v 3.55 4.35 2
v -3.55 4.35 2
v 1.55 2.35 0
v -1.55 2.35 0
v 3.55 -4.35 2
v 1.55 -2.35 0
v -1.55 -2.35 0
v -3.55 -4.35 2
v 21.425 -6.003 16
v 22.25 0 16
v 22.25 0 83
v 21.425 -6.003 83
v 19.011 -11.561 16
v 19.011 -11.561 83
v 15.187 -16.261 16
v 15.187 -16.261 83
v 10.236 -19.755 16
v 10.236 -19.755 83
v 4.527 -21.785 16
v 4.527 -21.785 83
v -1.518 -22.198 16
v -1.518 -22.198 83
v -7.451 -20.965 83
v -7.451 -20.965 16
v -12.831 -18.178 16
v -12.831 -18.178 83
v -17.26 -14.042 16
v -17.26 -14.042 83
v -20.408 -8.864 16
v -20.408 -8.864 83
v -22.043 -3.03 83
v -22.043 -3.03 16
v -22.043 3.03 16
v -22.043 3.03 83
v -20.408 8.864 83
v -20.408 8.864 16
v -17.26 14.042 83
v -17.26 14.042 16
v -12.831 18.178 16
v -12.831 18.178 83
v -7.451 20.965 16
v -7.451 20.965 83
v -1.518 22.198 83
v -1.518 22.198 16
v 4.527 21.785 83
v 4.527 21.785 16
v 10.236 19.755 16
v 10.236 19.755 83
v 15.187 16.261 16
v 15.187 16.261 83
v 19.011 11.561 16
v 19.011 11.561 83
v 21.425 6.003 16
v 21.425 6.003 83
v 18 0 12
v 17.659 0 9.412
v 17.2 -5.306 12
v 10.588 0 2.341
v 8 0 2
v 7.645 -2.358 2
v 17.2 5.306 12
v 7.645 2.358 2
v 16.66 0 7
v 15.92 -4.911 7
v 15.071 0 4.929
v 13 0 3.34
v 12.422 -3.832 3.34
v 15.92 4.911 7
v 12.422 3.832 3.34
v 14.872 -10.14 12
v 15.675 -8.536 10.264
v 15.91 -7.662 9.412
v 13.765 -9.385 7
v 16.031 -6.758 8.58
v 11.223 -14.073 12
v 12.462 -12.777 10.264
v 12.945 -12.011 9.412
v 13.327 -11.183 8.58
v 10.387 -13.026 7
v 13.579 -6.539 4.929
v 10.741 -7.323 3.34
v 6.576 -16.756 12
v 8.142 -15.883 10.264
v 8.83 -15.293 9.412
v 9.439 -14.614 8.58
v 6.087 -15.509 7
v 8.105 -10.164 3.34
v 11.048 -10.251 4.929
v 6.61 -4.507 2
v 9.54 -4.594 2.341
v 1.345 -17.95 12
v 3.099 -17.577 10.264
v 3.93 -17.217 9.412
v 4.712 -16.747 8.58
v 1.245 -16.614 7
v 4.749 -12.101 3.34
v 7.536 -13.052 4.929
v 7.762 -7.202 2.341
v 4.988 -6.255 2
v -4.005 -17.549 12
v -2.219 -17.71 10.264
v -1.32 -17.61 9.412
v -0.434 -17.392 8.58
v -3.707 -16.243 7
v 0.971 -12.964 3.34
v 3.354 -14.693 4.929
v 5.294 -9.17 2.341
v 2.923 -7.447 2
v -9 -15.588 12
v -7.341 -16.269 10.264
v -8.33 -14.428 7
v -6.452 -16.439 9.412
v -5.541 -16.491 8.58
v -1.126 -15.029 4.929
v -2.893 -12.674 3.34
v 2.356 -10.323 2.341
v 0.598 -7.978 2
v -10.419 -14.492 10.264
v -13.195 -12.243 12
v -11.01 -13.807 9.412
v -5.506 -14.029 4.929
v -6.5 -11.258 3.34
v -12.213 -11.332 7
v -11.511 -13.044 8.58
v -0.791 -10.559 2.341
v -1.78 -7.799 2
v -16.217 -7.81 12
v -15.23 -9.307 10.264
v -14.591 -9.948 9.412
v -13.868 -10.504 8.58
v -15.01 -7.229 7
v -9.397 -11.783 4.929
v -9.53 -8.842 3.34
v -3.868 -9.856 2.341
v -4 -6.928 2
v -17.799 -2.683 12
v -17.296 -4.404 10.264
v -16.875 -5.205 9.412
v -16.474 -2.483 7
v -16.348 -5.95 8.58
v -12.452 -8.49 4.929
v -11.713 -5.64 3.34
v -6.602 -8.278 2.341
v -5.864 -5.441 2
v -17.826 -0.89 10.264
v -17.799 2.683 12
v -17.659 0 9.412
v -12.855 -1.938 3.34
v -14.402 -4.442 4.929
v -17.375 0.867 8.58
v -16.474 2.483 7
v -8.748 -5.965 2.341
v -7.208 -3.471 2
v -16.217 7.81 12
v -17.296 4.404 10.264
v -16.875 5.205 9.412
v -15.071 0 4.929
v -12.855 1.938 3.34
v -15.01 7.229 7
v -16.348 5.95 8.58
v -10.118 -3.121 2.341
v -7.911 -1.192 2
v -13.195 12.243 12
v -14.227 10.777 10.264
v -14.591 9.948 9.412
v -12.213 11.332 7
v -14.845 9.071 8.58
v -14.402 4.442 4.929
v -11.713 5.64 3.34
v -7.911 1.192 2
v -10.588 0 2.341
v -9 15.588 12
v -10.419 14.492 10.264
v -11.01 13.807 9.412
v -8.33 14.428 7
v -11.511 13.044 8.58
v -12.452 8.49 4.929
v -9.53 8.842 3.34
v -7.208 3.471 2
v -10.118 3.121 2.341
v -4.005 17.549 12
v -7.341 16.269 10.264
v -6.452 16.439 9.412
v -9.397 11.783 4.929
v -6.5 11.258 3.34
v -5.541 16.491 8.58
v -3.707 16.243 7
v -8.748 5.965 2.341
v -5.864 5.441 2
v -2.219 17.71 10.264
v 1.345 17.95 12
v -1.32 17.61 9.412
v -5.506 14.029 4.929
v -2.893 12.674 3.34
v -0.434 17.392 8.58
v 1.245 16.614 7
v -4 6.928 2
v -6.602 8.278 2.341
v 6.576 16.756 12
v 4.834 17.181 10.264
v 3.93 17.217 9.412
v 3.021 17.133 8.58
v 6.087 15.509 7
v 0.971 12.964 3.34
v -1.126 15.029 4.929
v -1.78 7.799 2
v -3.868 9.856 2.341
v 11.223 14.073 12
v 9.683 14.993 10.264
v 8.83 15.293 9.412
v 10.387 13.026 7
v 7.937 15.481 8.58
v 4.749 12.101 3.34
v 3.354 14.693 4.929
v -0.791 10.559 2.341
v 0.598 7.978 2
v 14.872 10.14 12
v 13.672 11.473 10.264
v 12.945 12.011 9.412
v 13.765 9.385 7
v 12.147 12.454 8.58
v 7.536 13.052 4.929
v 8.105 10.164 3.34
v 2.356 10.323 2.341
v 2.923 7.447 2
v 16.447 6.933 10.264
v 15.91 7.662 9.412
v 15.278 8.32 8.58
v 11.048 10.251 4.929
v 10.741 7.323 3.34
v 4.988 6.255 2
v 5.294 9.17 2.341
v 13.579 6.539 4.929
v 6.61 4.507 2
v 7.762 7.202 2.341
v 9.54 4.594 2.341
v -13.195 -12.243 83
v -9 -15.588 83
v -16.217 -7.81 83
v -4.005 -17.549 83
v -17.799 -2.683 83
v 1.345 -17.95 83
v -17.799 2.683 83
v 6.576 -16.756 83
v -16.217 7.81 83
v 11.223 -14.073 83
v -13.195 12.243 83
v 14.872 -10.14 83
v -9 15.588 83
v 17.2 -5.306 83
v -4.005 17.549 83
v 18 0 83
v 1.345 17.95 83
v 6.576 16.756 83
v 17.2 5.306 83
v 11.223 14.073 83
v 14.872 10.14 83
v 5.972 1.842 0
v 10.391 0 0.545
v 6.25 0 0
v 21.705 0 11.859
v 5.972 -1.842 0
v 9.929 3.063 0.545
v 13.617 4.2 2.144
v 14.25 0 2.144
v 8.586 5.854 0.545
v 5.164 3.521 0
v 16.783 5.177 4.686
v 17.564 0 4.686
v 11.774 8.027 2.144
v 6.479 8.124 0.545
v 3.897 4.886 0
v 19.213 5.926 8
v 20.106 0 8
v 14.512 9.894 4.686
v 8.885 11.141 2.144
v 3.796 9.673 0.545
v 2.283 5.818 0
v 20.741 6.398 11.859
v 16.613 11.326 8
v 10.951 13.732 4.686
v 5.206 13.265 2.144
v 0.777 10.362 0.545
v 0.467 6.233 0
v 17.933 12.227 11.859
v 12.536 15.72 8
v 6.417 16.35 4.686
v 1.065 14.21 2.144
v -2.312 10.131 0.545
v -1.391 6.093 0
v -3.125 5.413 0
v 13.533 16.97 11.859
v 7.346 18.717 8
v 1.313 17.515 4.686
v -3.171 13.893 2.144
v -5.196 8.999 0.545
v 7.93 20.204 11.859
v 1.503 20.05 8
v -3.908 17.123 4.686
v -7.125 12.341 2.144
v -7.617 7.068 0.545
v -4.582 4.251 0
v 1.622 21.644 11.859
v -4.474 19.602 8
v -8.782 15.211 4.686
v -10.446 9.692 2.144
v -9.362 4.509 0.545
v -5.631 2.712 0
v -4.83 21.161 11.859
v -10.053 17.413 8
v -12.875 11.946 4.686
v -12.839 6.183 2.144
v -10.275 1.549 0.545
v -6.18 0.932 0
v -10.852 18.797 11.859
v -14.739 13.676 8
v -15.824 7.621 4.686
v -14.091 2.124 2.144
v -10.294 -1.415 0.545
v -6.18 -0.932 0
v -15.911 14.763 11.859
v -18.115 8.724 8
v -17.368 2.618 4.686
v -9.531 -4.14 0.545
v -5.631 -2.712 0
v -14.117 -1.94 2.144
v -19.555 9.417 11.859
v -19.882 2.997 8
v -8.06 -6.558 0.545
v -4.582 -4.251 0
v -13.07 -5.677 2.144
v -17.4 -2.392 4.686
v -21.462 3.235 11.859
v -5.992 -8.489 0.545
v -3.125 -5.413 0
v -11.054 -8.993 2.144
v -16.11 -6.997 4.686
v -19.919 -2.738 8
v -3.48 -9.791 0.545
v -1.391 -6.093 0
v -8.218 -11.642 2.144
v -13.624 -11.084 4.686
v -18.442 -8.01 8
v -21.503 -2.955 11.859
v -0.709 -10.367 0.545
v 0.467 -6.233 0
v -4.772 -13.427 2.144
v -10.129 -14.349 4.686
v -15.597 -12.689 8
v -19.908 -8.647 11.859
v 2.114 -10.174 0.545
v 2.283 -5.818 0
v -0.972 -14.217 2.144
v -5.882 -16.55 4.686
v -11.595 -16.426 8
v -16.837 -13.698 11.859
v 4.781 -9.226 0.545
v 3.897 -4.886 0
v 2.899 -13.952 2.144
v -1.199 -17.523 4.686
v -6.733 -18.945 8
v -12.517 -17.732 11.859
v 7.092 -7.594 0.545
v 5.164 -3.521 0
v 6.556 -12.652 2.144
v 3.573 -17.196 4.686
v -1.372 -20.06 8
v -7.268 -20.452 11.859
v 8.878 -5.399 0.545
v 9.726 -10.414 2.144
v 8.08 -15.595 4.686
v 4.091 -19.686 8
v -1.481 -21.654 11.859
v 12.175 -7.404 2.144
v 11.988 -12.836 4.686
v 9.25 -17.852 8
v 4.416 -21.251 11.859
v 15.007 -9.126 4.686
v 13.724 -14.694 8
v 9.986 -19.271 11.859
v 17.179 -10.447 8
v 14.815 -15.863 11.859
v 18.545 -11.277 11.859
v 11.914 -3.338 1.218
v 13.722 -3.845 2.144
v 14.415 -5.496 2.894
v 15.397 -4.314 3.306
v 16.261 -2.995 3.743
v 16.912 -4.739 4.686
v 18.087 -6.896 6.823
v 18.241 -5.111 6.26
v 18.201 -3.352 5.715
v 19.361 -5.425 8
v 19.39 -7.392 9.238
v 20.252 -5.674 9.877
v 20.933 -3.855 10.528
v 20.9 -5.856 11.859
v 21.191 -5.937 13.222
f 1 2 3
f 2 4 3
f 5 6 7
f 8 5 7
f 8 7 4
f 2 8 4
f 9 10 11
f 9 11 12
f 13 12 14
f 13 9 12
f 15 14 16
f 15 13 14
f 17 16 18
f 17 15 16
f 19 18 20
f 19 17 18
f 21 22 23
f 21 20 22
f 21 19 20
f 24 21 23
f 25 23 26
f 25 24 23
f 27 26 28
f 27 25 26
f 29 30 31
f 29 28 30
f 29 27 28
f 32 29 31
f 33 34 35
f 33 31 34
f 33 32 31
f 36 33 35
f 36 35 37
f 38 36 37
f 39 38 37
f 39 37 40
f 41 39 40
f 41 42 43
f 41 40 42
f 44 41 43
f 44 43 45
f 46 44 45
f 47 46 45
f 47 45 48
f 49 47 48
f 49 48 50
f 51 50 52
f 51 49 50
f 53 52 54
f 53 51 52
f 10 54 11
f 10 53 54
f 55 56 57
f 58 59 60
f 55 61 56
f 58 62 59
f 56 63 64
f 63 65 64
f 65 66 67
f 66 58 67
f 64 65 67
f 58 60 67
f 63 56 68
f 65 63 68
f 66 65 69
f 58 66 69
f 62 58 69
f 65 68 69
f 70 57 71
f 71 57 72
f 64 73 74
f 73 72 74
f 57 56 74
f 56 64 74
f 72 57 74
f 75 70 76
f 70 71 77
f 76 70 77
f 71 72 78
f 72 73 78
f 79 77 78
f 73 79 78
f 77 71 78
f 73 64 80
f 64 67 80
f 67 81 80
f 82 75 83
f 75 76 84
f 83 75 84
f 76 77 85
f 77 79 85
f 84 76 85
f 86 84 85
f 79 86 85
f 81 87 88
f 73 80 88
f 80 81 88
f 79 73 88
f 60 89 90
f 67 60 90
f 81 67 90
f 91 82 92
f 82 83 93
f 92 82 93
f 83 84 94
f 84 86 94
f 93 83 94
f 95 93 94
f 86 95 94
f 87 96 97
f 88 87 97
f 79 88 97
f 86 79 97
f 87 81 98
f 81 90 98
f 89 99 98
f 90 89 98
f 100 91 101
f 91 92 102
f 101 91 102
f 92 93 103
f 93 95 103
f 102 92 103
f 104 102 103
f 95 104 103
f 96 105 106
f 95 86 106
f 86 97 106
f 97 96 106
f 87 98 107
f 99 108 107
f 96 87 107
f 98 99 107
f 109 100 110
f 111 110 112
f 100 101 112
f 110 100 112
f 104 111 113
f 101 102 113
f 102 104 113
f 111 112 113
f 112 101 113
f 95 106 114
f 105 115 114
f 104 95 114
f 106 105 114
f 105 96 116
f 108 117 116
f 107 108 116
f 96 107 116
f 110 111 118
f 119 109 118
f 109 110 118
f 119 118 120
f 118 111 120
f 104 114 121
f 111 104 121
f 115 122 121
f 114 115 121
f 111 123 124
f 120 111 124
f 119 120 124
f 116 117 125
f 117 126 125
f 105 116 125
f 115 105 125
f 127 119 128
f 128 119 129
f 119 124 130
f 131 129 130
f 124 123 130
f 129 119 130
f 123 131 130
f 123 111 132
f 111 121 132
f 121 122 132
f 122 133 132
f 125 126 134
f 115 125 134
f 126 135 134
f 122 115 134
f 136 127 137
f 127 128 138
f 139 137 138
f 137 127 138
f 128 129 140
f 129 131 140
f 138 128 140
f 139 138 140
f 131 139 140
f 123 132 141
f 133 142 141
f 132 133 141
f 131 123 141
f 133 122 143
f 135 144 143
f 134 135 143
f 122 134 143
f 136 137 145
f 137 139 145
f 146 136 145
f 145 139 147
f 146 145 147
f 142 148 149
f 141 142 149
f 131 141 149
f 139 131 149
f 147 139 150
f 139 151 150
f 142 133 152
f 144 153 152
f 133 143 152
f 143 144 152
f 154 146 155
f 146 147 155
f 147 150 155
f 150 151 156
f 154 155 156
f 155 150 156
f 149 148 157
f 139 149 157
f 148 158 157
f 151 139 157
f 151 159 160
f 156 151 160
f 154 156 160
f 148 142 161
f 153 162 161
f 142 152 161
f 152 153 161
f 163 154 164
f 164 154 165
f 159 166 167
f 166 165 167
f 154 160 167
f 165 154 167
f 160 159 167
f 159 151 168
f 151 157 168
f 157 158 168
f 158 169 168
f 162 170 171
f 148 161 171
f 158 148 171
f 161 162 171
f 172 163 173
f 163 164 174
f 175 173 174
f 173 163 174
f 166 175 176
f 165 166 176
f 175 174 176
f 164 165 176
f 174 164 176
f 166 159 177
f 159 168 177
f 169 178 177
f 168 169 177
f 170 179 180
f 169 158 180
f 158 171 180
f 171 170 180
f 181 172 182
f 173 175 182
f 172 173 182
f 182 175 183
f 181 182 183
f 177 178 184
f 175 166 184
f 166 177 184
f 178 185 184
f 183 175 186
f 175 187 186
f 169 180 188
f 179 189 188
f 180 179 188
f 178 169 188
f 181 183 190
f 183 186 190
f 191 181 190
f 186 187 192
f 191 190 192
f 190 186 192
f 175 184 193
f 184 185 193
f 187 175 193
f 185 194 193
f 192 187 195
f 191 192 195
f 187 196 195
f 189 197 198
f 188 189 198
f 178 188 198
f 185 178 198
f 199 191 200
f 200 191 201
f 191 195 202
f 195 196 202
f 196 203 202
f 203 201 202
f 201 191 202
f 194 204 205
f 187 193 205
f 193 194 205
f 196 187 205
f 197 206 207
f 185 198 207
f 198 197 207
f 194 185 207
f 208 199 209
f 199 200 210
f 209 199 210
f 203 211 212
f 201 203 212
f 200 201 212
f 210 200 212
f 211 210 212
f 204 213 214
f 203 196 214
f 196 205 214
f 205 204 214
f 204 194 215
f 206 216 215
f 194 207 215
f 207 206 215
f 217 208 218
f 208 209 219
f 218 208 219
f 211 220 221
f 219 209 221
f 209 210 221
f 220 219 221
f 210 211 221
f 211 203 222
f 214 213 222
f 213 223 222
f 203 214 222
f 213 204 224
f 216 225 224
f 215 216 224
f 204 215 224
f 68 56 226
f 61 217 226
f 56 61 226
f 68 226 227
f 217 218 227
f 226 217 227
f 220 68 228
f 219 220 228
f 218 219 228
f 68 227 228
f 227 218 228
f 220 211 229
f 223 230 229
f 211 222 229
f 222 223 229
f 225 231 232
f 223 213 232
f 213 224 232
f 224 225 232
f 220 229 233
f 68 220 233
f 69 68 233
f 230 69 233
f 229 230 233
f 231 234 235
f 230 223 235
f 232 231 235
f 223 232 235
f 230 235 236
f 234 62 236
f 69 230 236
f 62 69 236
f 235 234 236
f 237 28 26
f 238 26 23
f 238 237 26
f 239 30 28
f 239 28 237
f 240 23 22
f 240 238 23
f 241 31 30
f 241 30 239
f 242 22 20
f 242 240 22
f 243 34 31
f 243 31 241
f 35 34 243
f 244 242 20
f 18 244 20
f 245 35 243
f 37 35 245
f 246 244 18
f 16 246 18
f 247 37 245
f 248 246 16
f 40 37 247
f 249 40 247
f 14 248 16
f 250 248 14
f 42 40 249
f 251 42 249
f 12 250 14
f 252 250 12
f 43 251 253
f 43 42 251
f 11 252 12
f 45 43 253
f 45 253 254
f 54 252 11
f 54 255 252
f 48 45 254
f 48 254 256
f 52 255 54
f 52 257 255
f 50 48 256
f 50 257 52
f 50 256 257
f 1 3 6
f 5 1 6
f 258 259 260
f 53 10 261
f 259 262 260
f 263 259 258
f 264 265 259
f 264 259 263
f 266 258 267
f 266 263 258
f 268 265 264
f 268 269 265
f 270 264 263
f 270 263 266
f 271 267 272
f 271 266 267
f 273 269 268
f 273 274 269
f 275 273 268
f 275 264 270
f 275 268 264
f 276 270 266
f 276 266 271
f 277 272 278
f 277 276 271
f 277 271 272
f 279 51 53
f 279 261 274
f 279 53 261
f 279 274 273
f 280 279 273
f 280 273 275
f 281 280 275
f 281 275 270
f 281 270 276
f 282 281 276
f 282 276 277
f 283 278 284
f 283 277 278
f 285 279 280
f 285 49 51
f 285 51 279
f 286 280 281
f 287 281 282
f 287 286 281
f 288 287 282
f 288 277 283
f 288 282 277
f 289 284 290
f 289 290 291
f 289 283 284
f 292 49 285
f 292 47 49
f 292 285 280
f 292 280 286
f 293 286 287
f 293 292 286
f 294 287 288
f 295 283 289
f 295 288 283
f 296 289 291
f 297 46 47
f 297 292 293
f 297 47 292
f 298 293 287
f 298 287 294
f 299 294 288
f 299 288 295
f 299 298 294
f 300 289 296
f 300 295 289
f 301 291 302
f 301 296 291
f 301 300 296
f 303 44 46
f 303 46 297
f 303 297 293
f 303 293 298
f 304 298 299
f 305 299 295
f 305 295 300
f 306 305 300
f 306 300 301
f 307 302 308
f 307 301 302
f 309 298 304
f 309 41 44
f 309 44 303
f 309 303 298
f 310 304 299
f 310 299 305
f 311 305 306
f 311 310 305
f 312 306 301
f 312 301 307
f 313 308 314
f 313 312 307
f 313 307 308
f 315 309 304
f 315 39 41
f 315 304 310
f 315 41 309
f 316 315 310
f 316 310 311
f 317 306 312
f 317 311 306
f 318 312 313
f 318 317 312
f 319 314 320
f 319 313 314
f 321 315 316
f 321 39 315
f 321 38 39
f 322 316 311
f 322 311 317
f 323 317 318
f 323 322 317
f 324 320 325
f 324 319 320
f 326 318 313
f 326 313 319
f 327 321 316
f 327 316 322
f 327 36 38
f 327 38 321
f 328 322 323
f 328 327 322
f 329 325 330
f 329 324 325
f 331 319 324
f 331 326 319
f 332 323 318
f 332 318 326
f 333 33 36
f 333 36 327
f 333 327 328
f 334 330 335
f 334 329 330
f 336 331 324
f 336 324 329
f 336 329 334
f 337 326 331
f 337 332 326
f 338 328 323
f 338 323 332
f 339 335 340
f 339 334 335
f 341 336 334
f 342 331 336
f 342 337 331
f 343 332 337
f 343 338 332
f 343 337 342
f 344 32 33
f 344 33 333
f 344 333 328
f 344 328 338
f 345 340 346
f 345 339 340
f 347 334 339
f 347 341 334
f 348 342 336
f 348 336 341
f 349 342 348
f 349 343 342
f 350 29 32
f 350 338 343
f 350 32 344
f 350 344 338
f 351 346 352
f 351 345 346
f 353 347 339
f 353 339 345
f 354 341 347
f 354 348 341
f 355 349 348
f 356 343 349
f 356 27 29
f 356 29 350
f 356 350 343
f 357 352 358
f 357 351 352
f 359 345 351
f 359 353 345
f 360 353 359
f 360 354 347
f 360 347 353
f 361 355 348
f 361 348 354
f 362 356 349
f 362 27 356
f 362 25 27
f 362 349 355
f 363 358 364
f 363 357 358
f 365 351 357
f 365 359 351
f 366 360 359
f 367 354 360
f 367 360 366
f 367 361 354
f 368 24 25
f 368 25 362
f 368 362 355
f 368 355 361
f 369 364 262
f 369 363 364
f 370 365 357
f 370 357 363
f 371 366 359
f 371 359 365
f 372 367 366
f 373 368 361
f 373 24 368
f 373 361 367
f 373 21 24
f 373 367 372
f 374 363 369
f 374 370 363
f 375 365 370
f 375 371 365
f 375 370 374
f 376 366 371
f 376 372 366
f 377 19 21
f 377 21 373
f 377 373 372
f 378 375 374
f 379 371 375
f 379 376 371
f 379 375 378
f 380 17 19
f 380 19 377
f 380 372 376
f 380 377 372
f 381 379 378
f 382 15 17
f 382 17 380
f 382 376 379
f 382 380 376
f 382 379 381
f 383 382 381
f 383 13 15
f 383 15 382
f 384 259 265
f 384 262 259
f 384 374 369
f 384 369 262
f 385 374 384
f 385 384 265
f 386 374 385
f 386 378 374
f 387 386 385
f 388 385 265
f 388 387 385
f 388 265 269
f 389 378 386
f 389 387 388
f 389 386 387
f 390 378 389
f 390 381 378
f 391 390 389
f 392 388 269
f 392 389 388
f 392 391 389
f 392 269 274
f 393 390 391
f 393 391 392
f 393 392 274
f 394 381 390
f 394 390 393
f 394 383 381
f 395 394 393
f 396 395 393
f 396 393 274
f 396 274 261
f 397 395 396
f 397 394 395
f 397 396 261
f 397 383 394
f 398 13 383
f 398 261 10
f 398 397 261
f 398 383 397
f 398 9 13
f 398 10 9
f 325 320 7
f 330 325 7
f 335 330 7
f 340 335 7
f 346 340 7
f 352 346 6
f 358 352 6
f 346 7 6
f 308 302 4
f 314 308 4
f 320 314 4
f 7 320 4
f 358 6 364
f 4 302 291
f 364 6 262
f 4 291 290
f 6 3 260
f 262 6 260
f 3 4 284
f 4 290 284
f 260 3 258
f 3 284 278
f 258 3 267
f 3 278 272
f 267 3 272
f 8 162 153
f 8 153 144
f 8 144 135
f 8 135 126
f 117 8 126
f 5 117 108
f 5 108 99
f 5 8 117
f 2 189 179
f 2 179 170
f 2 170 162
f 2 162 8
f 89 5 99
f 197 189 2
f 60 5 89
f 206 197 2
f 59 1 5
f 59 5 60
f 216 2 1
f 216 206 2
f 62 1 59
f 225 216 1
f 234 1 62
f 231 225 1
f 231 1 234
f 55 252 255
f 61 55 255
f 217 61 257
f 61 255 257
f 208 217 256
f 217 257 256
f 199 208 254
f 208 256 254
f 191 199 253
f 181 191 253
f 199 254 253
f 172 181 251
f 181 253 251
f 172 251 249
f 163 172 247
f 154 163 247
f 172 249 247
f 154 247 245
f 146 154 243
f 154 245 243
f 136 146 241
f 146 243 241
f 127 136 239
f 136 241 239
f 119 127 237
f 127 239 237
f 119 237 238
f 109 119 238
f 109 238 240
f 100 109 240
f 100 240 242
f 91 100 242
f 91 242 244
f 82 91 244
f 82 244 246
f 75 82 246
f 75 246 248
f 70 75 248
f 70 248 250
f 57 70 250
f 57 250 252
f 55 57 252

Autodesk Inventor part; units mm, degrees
ref_plane "YZ Plane" through (0, 0, 0) normal (1, 0, 0) x (0, 1, 0)
ref_plane "XZ Plane" through (0, 0, 0) normal (0, 1, 0) x (-1, 0, 0)
ref_plane "XY Plane" through (0, 0, 0) normal (0, 0, 1) x (1, 0, 0)
sketch "Sketch2" plane through (0, 0, 0) normal (0, 0, 1) x (1, 0, 0)
  circle A0 centre (0, 0) radius 22.25
  dimension "d2" = 44.5
extrude "Extrusion1" add sketch "Sketch2" along normal blind 83
sketch "Sketch9" plane through (0, 0, 83) normal (0, 0, 1) x (1, 0, 0)
  circle A0 centre (0, 0) radius 22.25 projected
  line L0 (-31.15, 0) -> (31.15, 0) projected
  line L1 (0, -31.15) -> (0, 31.15) projected
  circle A1 centre (0, 0) radius 18
  dimension "d54" = 36
extrude "Extrusion7" cut sketch "Sketch9" against normal blind 81 contours A1 L1 L0 | L0 L1 A1 | L1 L0 A1 | A1 L0 L1
fillet "Fillet12" radius 10 1 edges at (-18, 0, 2)
sketch "Sketch18" plane through (0, 0, 2) normal (0, 0, 1) x (1, 0, 0)
  line L0 (-31.15, 0) -> (31.15, 0) projected
  line L1 (0, -31.15) -> (0, 31.15) projected
  line L2 (1.55, 2.35) -> (-1.55, 2.35)
  line L3 (-1.55, 2.35) -> (-1.55, -2.35)
  line L4 (-1.55, -2.35) -> (1.55, -2.35)
  line L5 (1.55, -2.35) -> (1.55, 2.35)
  line L6 (1.55, 2.35) -> (-1.55, -2.35) construction
  line L7 (-1.55, 2.35) -> (1.55, -2.35) construction
  point P0 (0, 0)
  dimension "d122" = 3.1
  dimension "d123" = 4.7
extrude "Extrusion15" cut sketch "Sketch18" against normal through all
chamfer "Chamfer8" distance 2 angle 45 4 edges at (1.55, 0, 2) (0, 2.35, 2) (0, -2.35, 2) (-1.55, 0, 2)
fillet "Fillet13" radius 16 1 edges at (-22.25, 0, 0)
equation "\"BendRadius\" = Thickness"
equation "\"BendReliefWidth\" = Thickness"
equation "\"BendReliefDepth\" = 0.5 * Thickness"
equation "\"CornerReliefSize\" = 4 * Thickness"
equation "\"MinimumRemnant\" = 2 * Thickness"
equation "\"TransitionRadius\" = BendRadius"
equation "\"JacobiRadiusSize\" = BendRadius"
equation "\"GapSize\" = Thickness"
equation "\"Thickness\" = 3.048"
properties part number "_3DPrint"
